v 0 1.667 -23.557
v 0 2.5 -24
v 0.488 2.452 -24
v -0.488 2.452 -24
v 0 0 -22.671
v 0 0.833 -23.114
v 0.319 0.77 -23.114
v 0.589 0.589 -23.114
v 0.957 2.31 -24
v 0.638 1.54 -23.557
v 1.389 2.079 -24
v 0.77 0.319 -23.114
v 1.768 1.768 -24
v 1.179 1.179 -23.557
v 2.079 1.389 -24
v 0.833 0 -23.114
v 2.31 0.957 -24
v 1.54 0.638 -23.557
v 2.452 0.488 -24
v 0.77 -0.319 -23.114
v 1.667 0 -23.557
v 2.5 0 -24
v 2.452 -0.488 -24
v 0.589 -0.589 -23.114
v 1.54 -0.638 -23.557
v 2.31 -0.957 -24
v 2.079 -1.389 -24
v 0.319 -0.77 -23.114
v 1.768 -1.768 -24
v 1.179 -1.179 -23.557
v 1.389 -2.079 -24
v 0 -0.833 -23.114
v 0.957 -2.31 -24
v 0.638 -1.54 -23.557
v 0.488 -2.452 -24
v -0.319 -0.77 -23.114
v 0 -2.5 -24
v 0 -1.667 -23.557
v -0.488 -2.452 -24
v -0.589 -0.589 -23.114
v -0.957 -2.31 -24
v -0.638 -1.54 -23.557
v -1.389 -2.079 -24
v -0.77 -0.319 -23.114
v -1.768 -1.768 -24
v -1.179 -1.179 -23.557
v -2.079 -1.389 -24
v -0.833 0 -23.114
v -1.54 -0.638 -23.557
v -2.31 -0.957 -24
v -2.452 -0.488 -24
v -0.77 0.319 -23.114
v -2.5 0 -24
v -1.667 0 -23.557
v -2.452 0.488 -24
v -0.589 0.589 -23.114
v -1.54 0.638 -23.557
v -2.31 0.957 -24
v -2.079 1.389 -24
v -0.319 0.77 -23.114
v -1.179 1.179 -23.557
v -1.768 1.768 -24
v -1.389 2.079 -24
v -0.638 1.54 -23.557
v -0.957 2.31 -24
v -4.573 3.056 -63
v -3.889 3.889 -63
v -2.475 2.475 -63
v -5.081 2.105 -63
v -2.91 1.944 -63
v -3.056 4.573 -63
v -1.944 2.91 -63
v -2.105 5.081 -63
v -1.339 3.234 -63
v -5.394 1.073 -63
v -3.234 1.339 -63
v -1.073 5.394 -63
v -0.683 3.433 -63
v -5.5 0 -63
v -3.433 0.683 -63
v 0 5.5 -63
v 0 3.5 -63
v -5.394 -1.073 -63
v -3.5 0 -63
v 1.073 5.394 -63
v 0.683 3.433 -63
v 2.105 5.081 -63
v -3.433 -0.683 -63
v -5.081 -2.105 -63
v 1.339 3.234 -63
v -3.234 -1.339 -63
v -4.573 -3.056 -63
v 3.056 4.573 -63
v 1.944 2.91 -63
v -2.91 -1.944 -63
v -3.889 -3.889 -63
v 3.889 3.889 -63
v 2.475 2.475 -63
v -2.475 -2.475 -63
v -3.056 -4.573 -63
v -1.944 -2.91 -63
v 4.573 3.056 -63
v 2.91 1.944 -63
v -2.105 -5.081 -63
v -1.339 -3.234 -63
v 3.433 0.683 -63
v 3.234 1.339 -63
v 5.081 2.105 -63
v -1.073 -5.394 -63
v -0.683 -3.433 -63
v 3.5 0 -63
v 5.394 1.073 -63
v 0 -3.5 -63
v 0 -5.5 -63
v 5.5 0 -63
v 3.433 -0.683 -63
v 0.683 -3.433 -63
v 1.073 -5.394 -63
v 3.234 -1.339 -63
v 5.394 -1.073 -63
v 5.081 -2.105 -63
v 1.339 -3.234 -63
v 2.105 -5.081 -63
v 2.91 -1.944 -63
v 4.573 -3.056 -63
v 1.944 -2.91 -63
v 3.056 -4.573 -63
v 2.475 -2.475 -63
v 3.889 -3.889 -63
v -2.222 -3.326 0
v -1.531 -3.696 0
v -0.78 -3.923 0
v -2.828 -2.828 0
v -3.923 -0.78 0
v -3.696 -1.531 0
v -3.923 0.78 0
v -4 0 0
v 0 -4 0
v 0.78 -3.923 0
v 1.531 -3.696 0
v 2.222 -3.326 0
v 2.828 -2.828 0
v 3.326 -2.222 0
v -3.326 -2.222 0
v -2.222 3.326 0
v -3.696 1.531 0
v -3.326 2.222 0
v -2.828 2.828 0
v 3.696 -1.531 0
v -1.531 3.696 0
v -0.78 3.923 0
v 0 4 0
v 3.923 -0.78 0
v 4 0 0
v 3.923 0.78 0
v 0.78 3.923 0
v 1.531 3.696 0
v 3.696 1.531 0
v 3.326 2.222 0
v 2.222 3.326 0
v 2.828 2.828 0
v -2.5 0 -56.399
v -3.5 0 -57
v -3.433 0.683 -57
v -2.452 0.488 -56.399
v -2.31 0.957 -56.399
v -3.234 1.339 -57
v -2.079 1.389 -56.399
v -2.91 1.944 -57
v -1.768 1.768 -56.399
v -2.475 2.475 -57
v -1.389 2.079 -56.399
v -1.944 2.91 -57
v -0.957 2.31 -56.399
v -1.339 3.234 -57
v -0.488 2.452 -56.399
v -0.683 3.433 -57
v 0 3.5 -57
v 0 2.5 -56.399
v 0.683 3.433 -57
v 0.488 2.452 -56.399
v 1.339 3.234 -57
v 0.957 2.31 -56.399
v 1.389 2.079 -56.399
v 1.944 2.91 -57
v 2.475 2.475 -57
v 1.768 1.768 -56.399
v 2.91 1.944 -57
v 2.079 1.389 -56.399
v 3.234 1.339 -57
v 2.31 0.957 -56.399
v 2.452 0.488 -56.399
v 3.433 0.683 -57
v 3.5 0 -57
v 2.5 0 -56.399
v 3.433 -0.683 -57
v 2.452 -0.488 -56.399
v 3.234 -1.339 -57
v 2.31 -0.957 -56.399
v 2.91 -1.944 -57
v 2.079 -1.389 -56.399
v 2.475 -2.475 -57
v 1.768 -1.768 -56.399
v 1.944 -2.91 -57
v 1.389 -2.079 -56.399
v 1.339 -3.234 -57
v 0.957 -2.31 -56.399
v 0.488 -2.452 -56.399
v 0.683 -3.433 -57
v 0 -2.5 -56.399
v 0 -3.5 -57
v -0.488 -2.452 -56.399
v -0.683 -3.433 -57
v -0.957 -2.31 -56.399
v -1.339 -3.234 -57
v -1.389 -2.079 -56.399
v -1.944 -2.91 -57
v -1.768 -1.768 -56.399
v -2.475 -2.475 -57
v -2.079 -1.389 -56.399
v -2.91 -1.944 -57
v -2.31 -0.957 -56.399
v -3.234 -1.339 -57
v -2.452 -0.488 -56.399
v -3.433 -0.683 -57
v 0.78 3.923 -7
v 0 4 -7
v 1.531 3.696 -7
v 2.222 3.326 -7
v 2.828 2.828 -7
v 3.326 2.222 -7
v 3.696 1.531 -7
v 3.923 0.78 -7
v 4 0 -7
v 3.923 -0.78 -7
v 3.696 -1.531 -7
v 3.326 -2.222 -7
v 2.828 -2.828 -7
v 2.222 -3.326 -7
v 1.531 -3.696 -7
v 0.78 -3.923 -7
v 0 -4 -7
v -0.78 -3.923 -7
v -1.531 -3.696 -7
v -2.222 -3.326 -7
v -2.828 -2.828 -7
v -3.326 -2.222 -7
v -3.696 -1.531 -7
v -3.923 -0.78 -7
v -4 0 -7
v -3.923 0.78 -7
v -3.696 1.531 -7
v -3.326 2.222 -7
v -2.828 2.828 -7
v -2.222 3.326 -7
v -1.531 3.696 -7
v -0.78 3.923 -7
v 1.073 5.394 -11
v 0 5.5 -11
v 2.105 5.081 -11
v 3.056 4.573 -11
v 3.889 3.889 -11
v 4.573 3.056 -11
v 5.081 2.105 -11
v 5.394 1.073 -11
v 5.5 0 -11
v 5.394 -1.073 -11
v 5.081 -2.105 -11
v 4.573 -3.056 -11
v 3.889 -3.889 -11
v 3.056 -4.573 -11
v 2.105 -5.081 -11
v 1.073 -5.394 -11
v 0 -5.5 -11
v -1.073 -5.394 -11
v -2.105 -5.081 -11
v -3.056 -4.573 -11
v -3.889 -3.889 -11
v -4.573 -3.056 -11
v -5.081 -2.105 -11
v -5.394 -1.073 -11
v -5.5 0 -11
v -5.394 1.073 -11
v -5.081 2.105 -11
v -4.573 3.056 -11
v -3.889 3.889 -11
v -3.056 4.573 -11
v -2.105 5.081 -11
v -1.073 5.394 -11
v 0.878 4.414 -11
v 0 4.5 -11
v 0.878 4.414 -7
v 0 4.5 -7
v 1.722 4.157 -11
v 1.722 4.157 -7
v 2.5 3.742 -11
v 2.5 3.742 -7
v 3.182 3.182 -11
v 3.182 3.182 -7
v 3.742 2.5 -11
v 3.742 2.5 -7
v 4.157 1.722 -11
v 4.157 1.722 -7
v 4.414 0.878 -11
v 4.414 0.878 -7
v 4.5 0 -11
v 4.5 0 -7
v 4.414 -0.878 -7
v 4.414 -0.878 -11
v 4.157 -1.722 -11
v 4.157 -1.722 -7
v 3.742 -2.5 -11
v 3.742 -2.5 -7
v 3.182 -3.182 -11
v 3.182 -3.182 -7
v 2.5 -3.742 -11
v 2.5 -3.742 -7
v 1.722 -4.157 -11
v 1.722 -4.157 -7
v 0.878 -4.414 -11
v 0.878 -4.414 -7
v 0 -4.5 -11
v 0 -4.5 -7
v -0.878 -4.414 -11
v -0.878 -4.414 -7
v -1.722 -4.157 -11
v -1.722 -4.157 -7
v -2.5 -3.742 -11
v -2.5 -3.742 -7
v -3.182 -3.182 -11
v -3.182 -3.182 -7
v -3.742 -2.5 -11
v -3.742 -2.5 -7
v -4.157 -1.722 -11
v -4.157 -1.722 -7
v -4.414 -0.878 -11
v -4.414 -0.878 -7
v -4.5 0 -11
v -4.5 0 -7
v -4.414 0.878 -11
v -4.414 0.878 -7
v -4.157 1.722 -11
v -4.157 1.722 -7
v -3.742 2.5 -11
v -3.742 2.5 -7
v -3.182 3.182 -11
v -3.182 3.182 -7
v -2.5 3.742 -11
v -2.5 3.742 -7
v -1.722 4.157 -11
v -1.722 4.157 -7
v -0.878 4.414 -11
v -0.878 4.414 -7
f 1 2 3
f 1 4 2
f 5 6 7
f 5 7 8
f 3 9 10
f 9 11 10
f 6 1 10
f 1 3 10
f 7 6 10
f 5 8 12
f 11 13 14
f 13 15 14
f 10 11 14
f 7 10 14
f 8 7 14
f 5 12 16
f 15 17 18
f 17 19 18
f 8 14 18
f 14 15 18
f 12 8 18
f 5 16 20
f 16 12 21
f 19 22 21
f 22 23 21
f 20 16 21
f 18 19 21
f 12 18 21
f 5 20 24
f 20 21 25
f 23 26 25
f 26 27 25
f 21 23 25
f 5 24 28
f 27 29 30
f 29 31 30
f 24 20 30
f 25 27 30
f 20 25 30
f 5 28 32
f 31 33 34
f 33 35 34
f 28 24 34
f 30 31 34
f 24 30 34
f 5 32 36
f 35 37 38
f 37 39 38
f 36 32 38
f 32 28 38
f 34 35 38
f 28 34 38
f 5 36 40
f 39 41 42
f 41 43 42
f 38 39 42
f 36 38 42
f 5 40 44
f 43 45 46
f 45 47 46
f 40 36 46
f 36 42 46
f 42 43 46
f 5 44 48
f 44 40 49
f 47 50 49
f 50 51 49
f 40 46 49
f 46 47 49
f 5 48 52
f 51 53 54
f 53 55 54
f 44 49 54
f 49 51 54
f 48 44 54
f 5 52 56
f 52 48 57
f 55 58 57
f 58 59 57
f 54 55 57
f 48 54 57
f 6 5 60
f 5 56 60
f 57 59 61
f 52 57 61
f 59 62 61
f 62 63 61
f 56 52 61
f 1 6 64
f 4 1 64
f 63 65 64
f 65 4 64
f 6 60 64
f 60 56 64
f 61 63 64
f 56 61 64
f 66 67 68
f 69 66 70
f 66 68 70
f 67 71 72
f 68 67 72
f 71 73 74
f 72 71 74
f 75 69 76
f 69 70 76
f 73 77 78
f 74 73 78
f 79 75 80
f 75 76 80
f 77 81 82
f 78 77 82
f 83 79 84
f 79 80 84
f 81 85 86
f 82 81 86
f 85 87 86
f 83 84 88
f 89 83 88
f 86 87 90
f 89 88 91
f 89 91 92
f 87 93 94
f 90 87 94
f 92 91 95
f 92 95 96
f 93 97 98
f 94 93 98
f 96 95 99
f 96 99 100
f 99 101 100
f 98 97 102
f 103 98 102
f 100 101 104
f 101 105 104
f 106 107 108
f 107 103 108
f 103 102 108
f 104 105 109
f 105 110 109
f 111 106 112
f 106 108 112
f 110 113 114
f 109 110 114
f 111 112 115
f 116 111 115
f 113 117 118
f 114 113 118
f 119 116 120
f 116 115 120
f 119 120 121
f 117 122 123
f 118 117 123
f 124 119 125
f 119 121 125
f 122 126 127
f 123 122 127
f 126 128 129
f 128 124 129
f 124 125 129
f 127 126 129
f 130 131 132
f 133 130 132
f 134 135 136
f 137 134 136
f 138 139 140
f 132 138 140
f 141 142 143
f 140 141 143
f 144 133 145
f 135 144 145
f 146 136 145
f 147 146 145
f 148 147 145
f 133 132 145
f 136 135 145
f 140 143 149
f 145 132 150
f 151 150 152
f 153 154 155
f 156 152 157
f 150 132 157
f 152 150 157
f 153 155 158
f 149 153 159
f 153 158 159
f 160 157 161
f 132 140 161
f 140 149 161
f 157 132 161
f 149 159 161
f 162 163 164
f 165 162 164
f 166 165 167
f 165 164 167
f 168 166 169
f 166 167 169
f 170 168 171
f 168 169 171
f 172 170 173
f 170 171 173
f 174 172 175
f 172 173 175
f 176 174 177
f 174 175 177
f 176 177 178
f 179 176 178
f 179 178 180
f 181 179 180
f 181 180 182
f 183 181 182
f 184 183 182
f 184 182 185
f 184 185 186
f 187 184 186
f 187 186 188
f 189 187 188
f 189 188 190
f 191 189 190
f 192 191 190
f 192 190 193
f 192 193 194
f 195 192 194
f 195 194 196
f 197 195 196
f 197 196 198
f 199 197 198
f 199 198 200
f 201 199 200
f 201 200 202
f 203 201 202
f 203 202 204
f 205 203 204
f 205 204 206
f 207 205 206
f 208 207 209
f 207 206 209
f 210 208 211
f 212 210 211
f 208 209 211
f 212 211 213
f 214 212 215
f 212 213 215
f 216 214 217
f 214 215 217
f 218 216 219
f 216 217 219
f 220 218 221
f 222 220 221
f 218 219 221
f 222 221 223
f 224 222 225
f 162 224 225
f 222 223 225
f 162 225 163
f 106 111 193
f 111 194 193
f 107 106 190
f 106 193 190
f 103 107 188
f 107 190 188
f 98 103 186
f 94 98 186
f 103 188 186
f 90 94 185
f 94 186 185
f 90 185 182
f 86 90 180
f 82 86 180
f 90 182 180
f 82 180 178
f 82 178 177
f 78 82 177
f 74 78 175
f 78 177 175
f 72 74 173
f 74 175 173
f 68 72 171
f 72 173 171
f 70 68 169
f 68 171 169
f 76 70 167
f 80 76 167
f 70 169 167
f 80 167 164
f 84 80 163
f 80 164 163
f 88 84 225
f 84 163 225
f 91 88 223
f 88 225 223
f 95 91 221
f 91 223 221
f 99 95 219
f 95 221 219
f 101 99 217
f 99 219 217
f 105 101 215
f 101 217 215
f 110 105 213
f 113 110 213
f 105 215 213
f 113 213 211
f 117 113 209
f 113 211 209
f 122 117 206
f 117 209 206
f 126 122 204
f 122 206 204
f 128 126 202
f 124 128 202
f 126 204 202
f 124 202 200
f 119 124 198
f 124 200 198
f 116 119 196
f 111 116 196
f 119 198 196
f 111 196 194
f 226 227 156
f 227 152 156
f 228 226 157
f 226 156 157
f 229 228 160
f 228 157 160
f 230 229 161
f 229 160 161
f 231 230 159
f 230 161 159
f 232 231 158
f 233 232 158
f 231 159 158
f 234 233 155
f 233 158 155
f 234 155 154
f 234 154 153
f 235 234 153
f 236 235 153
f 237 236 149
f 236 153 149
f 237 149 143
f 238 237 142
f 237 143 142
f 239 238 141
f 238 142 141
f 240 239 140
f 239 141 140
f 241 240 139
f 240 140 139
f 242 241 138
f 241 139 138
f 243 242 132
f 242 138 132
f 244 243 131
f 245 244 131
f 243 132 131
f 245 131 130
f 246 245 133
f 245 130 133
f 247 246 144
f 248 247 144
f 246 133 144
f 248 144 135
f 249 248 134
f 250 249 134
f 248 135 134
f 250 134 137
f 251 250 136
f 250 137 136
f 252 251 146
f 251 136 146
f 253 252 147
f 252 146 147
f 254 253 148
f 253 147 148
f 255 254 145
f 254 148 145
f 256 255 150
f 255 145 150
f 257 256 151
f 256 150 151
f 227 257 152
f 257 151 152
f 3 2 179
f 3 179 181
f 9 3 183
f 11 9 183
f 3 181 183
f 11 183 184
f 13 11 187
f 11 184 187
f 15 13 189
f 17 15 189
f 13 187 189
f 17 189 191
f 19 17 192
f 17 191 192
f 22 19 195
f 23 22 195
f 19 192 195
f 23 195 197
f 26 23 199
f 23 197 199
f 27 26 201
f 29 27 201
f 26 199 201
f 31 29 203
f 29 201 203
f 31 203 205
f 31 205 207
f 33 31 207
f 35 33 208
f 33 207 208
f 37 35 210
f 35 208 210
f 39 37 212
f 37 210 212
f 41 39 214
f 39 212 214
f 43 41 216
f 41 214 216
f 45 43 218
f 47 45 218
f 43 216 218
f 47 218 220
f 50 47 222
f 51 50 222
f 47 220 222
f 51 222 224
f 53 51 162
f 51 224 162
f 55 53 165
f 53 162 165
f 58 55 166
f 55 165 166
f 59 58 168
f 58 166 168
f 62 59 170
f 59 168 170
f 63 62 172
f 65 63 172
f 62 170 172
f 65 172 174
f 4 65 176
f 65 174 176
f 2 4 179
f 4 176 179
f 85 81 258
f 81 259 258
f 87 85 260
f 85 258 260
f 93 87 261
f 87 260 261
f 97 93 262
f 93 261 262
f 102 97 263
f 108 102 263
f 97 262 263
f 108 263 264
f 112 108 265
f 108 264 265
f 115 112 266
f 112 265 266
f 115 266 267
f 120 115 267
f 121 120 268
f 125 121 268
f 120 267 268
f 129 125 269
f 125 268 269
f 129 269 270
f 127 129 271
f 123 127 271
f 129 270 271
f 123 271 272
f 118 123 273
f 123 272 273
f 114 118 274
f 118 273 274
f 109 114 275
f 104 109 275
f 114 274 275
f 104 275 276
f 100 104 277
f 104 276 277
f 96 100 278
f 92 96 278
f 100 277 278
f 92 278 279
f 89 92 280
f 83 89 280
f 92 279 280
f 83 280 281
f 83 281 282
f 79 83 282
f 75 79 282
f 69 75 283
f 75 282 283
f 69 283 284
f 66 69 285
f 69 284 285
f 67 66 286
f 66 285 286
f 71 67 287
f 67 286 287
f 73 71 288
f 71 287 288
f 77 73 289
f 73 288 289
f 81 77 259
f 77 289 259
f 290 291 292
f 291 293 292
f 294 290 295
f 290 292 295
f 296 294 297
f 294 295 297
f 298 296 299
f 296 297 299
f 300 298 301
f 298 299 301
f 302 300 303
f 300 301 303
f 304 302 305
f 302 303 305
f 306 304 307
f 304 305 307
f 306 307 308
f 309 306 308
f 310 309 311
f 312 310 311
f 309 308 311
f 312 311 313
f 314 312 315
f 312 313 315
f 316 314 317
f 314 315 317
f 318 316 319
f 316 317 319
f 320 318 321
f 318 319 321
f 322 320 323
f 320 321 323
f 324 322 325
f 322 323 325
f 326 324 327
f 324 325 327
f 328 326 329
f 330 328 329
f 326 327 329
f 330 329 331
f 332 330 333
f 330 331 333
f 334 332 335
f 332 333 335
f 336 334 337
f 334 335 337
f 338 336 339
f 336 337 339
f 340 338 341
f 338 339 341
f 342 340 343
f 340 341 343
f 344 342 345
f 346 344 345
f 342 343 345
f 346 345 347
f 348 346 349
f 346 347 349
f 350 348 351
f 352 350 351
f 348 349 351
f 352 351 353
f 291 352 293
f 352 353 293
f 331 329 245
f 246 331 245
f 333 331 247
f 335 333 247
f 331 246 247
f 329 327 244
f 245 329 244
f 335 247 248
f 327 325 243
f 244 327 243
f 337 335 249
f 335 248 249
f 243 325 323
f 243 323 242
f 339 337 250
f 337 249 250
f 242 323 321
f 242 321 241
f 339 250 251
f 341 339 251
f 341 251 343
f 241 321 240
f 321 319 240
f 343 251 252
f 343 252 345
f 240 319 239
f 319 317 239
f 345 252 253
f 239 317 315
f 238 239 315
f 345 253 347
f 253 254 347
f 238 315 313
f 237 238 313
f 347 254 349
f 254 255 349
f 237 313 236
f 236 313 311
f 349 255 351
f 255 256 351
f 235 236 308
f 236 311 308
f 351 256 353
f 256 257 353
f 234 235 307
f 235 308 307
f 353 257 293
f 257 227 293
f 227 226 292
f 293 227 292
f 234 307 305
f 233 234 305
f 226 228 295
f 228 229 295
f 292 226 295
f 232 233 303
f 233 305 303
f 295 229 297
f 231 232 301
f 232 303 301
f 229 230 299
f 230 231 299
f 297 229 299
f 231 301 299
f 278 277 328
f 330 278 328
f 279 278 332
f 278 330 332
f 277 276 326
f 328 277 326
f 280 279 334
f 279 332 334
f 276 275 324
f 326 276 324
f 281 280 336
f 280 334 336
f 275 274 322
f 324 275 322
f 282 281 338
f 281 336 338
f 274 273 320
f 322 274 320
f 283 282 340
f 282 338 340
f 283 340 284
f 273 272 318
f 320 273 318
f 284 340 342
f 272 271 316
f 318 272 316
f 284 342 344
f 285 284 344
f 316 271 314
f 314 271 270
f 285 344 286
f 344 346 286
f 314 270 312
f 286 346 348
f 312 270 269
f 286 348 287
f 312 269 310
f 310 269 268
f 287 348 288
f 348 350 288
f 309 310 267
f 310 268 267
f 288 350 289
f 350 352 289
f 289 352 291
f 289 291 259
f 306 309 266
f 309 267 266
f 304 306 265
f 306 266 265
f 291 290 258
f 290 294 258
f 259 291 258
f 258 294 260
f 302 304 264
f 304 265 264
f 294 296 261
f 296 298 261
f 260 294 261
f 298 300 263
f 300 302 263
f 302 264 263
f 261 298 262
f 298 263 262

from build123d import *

# Parameters (mm, degrees)
TAP_DRILL_FOR_M8X1_0_TAP1_D     = 7
TAP_DRILL_FOR_M8X1_0_TAP1_DEPTH = 6
TAP_DRILL_FOR_M8X1_0_TAP1_TIP   = 2.103012167


with BuildPart() as part:
    # Sketch1 → Revolve1 (revolve)
    with BuildSketch(Plane(origin=(0, 0, 0), x_dir=(0, 0, -1), z_dir=(1, 0, 0))):
        Polygon((0, 0), (22.670726421, 0), (24, 2.5), (63, 2.5), (63, 5.5), (11, 5.5), (11, 4.5), (7, 4.5), (7, 4), (0, 4), align=None)
    revolve(axis=Axis((0, 0, 0), (0, 0, -1)))

    # Tap Drill for M8x1.0 Tap1
    with Locations(Plane(origin=(0, 0, -63), x_dir=(-1, 0, 0), z_dir=(0, 0, -1))):
        with Locations((0, 0)):
            Hole(TAP_DRILL_FOR_M8X1_0_TAP1_D / 2, depth=TAP_DRILL_FOR_M8X1_0_TAP1_DEPTH)
            with Locations((0, 0, -(TAP_DRILL_FOR_M8X1_0_TAP1_DEPTH + TAP_DRILL_FOR_M8X1_0_TAP1_TIP / 2))):  # 118° drill point
                Cone(0, TAP_DRILL_FOR_M8X1_0_TAP1_D / 2, TAP_DRILL_FOR_M8X1_0_TAP1_TIP, mode=Mode.SUBTRACT)


solid = part.part
